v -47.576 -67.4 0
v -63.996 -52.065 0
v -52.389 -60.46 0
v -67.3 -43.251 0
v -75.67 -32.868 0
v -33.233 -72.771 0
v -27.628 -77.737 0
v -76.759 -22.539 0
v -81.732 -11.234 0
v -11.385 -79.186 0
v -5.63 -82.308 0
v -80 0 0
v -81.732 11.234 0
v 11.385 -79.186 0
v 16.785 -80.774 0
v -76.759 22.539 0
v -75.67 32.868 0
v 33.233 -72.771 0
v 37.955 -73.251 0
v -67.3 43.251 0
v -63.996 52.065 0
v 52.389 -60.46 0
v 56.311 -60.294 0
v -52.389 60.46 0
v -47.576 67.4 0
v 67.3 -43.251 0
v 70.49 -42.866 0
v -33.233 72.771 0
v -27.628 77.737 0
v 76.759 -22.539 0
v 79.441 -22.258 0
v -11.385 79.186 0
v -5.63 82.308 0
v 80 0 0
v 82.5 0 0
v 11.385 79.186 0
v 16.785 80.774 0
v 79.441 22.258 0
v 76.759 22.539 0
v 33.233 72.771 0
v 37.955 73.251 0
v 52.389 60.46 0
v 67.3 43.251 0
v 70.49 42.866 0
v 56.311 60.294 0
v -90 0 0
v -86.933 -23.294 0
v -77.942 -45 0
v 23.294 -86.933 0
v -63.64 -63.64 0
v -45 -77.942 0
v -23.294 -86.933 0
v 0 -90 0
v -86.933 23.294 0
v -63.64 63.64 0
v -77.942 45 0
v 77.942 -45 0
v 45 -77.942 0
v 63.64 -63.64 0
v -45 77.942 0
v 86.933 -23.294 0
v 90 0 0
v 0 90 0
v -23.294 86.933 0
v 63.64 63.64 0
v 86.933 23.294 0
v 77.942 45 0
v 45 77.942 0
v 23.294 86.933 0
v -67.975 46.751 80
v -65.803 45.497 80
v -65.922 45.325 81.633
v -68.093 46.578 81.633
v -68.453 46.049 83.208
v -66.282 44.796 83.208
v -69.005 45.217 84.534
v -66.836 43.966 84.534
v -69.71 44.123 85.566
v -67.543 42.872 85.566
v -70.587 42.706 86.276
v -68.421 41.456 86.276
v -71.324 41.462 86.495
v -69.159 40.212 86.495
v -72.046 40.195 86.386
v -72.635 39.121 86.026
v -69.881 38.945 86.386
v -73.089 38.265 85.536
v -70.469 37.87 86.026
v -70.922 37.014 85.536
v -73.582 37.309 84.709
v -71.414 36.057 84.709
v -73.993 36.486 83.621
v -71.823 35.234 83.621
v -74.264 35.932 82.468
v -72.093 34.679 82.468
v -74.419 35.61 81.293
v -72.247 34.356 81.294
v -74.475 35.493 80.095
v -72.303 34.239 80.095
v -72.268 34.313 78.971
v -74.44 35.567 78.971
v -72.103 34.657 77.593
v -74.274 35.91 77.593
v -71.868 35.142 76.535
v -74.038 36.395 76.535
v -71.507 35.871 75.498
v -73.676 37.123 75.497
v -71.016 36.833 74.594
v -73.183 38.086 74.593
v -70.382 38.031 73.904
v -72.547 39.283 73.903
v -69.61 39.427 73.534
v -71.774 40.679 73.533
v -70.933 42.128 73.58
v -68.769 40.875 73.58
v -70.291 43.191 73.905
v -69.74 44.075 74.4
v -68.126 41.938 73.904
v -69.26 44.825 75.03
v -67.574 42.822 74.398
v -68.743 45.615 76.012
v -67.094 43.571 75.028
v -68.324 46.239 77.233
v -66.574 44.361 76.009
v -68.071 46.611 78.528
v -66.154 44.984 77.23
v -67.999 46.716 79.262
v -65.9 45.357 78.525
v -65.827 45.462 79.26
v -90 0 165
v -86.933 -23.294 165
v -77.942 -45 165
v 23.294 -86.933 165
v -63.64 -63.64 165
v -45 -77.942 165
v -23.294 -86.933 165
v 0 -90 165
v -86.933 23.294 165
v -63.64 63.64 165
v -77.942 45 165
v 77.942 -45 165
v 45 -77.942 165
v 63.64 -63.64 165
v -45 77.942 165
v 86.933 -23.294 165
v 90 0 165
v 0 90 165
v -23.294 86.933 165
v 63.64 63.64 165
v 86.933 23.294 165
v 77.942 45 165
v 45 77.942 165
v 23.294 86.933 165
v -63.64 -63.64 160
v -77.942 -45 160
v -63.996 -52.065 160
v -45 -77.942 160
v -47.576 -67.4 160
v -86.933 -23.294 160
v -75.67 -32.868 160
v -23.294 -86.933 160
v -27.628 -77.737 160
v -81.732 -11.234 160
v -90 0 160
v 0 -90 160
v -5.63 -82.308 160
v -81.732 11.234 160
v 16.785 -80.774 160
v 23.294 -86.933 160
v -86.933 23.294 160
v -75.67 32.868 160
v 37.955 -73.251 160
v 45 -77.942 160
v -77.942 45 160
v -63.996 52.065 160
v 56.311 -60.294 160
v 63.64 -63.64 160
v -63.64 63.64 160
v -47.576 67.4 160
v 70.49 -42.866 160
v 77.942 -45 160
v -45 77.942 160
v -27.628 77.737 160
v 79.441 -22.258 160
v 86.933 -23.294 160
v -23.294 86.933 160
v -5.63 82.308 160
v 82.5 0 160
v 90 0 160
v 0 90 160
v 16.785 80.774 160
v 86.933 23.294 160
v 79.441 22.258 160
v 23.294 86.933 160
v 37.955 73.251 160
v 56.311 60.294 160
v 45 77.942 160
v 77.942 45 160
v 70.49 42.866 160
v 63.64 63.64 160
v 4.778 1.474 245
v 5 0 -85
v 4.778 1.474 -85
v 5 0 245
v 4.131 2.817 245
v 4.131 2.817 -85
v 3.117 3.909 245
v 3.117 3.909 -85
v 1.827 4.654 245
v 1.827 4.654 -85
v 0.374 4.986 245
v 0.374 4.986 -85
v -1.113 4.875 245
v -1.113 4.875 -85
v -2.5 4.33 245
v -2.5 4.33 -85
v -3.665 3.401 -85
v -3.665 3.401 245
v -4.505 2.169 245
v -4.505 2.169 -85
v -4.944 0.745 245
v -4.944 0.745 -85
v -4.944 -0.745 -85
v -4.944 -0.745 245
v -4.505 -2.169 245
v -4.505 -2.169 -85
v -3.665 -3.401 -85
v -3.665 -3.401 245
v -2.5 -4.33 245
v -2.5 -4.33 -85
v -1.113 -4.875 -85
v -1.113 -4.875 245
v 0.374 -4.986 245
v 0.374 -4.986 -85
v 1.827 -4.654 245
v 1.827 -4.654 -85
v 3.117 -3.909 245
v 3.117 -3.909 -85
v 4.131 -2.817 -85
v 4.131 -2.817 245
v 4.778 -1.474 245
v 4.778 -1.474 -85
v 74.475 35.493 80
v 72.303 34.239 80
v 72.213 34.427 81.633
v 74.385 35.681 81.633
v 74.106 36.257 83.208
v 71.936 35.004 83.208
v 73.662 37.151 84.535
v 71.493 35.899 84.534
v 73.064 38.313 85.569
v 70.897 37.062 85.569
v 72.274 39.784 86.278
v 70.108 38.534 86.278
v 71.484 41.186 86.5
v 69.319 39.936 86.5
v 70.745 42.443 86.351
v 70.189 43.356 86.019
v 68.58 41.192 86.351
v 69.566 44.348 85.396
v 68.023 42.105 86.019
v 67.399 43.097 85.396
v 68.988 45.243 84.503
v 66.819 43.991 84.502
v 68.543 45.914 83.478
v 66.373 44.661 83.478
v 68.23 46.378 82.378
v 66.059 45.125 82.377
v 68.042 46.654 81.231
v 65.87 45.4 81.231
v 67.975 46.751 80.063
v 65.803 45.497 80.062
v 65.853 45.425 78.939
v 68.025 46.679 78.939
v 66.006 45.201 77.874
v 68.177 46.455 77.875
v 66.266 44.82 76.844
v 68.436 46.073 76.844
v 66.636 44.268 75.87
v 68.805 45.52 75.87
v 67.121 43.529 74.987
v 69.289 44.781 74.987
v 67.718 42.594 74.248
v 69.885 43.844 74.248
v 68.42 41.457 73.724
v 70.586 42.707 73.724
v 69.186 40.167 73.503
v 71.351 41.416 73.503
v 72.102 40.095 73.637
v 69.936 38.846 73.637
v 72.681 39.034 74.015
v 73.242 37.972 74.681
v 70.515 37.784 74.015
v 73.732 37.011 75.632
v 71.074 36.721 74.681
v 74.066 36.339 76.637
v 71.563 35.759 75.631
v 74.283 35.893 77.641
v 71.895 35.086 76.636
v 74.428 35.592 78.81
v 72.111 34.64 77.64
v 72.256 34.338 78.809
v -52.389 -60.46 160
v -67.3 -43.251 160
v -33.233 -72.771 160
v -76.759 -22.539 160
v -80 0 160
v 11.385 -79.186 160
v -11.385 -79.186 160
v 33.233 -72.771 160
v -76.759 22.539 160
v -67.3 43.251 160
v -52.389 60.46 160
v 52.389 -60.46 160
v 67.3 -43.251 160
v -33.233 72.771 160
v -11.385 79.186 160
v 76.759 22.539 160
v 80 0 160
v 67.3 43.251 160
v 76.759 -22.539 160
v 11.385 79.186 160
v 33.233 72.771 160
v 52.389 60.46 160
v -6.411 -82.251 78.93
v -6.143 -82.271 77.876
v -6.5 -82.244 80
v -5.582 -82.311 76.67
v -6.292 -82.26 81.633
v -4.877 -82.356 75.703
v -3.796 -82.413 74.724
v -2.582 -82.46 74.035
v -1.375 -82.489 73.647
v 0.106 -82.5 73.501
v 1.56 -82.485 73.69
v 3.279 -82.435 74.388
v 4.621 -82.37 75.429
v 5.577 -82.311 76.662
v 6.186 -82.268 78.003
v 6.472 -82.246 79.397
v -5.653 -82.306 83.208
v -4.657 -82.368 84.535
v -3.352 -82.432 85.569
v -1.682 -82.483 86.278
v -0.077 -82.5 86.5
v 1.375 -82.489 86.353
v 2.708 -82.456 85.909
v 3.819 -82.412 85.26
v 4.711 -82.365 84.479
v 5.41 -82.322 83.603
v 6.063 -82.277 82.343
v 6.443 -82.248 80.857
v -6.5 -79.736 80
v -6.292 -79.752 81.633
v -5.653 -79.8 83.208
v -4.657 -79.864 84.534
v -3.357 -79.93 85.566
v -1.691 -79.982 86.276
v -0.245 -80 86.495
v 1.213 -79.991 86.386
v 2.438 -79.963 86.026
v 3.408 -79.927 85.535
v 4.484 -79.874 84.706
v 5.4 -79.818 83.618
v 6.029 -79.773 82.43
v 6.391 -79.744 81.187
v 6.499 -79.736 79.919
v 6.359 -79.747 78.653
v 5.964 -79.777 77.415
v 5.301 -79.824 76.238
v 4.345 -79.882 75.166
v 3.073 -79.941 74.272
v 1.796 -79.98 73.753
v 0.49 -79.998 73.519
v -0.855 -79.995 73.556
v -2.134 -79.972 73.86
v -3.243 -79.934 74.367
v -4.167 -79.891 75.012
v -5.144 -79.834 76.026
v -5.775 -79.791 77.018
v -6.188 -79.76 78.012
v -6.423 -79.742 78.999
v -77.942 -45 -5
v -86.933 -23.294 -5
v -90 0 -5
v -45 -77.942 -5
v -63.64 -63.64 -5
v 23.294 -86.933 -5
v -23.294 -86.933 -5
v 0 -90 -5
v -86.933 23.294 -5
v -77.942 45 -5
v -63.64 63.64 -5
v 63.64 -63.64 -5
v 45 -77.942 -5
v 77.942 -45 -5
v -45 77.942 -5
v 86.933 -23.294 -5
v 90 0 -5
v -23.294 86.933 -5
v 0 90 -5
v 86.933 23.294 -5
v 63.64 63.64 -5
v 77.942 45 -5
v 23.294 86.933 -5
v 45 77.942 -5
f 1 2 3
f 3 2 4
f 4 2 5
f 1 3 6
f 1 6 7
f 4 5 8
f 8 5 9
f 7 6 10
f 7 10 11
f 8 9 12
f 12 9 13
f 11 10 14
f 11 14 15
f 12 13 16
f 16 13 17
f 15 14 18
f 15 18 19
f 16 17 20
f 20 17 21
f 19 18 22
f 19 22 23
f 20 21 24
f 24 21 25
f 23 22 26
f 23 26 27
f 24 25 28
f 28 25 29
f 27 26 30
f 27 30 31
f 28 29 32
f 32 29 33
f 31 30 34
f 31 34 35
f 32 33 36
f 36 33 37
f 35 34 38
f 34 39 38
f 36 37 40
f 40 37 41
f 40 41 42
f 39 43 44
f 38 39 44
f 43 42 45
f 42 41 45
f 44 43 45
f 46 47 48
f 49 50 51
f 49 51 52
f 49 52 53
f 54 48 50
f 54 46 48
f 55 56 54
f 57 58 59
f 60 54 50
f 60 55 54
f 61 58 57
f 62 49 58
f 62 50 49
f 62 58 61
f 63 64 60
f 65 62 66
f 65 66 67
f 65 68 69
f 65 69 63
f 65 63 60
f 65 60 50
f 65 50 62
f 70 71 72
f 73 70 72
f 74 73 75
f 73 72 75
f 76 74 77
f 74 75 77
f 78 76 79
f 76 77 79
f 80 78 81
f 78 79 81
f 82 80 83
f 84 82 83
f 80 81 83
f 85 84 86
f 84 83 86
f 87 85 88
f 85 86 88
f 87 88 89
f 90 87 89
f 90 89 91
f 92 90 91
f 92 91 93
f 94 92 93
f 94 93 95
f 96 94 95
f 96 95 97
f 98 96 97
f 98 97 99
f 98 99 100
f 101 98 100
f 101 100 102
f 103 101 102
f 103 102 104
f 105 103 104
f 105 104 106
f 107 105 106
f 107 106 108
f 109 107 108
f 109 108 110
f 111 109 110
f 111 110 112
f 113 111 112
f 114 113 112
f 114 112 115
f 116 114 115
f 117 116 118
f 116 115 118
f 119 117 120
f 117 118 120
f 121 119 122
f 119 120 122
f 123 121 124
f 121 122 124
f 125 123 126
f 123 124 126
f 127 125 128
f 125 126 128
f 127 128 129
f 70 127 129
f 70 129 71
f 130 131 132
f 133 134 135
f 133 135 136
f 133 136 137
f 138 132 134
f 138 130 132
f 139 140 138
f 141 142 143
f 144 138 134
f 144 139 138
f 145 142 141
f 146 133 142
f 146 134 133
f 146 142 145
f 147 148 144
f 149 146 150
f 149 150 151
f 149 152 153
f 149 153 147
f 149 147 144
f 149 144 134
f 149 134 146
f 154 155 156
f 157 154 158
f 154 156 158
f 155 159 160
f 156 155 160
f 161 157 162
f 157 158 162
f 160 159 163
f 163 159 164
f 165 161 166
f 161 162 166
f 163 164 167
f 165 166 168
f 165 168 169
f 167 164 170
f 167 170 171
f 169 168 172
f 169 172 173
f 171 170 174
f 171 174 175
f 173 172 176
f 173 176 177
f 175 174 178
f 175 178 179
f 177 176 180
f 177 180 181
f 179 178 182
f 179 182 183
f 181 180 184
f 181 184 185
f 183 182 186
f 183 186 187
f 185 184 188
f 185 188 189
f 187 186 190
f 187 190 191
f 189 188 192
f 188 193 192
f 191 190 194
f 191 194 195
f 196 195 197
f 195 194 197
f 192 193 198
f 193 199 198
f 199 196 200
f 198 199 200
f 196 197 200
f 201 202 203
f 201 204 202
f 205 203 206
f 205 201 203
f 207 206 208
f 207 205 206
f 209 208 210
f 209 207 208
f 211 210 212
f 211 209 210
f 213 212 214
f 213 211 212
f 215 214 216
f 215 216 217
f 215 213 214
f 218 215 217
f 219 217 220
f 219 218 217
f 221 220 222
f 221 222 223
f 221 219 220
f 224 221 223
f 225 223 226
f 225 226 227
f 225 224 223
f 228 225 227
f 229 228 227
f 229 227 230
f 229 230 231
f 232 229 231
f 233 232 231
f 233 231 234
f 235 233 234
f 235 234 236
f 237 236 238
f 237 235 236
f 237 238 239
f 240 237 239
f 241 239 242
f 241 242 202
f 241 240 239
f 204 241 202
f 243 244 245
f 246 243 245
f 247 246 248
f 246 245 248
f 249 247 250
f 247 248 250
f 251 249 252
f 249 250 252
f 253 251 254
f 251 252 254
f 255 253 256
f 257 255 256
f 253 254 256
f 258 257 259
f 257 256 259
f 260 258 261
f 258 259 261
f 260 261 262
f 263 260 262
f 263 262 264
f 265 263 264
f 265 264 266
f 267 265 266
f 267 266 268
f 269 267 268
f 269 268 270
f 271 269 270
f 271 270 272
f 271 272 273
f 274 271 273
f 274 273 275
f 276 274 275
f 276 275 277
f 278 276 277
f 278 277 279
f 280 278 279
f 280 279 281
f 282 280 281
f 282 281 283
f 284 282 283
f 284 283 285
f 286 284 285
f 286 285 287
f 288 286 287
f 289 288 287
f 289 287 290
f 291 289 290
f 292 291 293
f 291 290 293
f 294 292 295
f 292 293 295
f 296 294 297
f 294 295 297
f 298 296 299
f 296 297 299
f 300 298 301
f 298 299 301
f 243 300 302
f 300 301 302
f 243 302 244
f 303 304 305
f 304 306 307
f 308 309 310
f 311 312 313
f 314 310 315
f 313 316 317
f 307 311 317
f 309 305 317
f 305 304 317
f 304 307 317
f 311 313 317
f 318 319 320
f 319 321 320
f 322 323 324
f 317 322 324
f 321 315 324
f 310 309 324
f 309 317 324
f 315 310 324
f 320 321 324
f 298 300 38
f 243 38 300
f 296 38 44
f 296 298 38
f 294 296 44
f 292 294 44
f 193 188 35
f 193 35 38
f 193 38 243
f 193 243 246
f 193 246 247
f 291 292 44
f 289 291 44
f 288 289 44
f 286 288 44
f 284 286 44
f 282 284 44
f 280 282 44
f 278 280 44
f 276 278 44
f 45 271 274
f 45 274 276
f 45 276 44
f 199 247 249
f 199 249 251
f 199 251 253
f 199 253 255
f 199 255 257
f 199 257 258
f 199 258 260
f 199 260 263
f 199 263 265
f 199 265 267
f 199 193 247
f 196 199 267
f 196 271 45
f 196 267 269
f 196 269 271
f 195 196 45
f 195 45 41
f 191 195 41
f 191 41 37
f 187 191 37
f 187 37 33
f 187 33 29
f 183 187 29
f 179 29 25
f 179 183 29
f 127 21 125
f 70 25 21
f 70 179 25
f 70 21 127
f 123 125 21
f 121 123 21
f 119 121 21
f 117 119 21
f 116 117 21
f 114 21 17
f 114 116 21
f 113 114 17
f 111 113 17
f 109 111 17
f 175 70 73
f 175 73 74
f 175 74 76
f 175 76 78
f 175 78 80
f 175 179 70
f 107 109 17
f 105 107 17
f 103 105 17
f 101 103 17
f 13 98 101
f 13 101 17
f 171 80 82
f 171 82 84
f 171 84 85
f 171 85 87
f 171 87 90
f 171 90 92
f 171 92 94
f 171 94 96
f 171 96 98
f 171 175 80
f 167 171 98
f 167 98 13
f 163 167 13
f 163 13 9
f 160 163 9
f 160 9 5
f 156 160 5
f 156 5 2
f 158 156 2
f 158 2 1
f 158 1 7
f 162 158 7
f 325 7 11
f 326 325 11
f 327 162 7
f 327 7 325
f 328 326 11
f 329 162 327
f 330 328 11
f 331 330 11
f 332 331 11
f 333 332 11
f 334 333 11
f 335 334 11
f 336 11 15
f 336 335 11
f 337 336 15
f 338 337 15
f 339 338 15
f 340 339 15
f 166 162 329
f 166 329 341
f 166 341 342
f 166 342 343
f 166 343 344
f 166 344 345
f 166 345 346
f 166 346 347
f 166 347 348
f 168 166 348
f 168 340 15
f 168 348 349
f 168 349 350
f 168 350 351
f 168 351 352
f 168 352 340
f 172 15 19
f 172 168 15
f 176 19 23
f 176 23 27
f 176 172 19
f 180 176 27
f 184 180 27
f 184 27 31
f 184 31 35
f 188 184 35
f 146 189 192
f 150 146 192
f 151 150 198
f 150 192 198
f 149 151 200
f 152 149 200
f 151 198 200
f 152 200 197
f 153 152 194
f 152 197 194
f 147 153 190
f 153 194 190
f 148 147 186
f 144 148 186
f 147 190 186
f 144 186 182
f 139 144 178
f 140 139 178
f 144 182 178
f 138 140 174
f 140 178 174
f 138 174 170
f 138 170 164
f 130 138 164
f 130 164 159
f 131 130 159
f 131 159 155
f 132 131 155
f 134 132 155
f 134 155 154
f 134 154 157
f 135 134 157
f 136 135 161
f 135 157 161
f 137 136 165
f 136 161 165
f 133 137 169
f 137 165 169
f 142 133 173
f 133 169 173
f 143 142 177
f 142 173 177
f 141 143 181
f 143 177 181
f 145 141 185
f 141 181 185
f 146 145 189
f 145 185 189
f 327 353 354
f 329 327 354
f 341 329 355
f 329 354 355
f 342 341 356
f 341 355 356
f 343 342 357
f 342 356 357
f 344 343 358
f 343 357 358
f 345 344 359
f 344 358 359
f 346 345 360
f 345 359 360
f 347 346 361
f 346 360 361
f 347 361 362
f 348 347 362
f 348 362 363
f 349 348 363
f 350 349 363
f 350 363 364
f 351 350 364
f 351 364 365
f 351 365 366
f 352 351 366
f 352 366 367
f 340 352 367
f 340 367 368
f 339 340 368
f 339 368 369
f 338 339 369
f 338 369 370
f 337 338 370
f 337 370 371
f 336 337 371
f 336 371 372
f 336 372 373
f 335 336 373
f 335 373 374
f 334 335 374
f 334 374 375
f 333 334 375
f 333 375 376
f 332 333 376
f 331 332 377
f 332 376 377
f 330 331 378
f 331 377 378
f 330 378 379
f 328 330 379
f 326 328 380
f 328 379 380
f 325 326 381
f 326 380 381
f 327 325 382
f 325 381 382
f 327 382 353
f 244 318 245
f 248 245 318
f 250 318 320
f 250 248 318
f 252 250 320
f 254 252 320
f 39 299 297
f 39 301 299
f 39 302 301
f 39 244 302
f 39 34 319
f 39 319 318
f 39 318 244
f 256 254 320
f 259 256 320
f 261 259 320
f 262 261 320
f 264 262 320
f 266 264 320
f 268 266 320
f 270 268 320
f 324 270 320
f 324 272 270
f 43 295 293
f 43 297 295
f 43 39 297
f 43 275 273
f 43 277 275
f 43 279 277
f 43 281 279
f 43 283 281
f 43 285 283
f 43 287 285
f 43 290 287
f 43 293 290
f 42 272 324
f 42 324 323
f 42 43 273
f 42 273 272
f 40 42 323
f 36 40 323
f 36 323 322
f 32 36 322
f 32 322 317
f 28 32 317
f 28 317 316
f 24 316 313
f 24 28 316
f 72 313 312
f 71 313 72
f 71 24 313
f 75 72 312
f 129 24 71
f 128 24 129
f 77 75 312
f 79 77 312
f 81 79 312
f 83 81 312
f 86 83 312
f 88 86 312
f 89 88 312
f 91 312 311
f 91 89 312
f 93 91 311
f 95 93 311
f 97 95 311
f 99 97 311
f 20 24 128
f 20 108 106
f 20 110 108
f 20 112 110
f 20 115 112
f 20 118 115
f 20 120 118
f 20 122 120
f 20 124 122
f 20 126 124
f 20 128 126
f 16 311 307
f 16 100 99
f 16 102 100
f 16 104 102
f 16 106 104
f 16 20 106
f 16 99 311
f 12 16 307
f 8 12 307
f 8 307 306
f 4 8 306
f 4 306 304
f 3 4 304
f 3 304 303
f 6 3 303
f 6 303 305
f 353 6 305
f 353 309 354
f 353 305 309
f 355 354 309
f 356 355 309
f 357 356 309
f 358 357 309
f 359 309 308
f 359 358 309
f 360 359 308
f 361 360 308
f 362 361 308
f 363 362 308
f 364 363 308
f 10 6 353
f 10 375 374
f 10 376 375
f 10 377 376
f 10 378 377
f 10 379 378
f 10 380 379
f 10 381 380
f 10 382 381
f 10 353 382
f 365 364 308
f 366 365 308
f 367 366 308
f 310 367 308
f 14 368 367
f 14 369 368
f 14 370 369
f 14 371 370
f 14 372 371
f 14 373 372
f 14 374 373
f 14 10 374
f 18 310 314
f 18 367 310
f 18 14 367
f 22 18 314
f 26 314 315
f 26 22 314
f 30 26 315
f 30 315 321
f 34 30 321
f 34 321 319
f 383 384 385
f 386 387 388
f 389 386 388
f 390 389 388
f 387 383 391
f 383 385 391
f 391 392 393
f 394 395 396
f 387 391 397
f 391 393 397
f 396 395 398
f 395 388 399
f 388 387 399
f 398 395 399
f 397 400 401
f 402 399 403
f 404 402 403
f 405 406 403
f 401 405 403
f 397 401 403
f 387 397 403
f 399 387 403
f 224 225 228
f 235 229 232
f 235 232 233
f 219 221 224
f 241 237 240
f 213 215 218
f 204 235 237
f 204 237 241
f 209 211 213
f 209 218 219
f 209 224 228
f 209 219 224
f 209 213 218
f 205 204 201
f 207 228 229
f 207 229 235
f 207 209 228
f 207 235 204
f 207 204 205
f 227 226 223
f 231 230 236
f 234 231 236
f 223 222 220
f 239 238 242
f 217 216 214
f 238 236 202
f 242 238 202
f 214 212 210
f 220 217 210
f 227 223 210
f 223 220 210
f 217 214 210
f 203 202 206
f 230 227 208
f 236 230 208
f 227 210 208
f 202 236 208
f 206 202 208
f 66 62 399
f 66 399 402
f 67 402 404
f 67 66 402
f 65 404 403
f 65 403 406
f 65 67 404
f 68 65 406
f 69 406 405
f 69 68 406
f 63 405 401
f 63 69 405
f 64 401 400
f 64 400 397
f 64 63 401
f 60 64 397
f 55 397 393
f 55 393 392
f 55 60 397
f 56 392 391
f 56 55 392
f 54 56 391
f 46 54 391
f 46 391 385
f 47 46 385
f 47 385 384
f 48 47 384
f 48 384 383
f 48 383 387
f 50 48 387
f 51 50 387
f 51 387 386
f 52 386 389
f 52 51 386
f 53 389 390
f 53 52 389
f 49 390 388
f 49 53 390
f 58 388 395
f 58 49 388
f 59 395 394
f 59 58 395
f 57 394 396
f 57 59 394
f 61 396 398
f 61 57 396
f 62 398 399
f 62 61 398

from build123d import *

# Parameters (mm, degrees)
F0_R            = 82.5
F0_R_2          = 80
F1_DEPTH        = 80
F0_R_3          = 90
F3_DEPTH        = 5
F7_D            = 13
F7_DEPTH        = 3.175
F7_TIP          = 3.9055940237
F7_COPIES_COUNT = 3
F8_R            = 5
F9_DEPTH        = 80
F9_DEPTH_BACK   = 250


# Not quite as in the source:
# - a pattern or mirror of a feature is missing from the dataset's text; its kind, count and spacing are read off the source's solid


with BuildPart() as f1:
    # F0 (on Top) → F1 (new body)
    with BuildSketch(Plane.XY):
        Circle(F0_R)
        Circle(F0_R_2, mode=Mode.SUBTRACT)
    extrude(amount=F1_DEPTH)

    # F4: F1, F3 across plane


with BuildPart() as f3:
    # F0 (on Top) → F3 (new body)
    with BuildSketch(Plane.XY):
        Circle(F0_R_3)
        Circle(F0_R, mode=Mode.SUBTRACT)
        Circle(F0_R)
        Circle(F0_R_2, mode=Mode.SUBTRACT)
        Circle(F0_R_2)
    extrude(amount=-F3_DEPTH)


with BuildPart() as f1_1:
    add(f1.part)
    add(f1.part.mirror(Plane.XY.offset(80)))
    add(f3.part.mirror(Plane.XY.offset(80)))

    # F7
    with Locations(Plane.XZ.offset(82.5)):
        with Locations((0, 80)):
            f7 = Hole(F7_D / 2, depth=F7_DEPTH)
            with Locations((0, 0, -(F7_DEPTH + F7_TIP / 2))):  # 118° drill point
                Cone(0, F7_D / 2, F7_TIP, mode=Mode.SUBTRACT)

    # F7_copies: F7 ×3 about axis
    f7_copies_axis = Axis((0, -8.6e-05, 0), (0, 0, 1))
    for i in range(1, F7_COPIES_COUNT):
        add(f7.rotate(f7_copies_axis, i * 360 / F7_COPIES_COUNT), mode=Mode.SUBTRACT)


with BuildPart() as f9:
    # F8 (on face) → F9 (new body, two sides)
    with BuildSketch(Plane.XY.offset(165)) as f9_sk:
        Circle(F8_R)
    extrude(amount=F9_DEPTH)
    extrude(f9_sk.sketch, amount=-F9_DEPTH_BACK)


solid = Compound([f3.part, f1_1.part, f9.part])
